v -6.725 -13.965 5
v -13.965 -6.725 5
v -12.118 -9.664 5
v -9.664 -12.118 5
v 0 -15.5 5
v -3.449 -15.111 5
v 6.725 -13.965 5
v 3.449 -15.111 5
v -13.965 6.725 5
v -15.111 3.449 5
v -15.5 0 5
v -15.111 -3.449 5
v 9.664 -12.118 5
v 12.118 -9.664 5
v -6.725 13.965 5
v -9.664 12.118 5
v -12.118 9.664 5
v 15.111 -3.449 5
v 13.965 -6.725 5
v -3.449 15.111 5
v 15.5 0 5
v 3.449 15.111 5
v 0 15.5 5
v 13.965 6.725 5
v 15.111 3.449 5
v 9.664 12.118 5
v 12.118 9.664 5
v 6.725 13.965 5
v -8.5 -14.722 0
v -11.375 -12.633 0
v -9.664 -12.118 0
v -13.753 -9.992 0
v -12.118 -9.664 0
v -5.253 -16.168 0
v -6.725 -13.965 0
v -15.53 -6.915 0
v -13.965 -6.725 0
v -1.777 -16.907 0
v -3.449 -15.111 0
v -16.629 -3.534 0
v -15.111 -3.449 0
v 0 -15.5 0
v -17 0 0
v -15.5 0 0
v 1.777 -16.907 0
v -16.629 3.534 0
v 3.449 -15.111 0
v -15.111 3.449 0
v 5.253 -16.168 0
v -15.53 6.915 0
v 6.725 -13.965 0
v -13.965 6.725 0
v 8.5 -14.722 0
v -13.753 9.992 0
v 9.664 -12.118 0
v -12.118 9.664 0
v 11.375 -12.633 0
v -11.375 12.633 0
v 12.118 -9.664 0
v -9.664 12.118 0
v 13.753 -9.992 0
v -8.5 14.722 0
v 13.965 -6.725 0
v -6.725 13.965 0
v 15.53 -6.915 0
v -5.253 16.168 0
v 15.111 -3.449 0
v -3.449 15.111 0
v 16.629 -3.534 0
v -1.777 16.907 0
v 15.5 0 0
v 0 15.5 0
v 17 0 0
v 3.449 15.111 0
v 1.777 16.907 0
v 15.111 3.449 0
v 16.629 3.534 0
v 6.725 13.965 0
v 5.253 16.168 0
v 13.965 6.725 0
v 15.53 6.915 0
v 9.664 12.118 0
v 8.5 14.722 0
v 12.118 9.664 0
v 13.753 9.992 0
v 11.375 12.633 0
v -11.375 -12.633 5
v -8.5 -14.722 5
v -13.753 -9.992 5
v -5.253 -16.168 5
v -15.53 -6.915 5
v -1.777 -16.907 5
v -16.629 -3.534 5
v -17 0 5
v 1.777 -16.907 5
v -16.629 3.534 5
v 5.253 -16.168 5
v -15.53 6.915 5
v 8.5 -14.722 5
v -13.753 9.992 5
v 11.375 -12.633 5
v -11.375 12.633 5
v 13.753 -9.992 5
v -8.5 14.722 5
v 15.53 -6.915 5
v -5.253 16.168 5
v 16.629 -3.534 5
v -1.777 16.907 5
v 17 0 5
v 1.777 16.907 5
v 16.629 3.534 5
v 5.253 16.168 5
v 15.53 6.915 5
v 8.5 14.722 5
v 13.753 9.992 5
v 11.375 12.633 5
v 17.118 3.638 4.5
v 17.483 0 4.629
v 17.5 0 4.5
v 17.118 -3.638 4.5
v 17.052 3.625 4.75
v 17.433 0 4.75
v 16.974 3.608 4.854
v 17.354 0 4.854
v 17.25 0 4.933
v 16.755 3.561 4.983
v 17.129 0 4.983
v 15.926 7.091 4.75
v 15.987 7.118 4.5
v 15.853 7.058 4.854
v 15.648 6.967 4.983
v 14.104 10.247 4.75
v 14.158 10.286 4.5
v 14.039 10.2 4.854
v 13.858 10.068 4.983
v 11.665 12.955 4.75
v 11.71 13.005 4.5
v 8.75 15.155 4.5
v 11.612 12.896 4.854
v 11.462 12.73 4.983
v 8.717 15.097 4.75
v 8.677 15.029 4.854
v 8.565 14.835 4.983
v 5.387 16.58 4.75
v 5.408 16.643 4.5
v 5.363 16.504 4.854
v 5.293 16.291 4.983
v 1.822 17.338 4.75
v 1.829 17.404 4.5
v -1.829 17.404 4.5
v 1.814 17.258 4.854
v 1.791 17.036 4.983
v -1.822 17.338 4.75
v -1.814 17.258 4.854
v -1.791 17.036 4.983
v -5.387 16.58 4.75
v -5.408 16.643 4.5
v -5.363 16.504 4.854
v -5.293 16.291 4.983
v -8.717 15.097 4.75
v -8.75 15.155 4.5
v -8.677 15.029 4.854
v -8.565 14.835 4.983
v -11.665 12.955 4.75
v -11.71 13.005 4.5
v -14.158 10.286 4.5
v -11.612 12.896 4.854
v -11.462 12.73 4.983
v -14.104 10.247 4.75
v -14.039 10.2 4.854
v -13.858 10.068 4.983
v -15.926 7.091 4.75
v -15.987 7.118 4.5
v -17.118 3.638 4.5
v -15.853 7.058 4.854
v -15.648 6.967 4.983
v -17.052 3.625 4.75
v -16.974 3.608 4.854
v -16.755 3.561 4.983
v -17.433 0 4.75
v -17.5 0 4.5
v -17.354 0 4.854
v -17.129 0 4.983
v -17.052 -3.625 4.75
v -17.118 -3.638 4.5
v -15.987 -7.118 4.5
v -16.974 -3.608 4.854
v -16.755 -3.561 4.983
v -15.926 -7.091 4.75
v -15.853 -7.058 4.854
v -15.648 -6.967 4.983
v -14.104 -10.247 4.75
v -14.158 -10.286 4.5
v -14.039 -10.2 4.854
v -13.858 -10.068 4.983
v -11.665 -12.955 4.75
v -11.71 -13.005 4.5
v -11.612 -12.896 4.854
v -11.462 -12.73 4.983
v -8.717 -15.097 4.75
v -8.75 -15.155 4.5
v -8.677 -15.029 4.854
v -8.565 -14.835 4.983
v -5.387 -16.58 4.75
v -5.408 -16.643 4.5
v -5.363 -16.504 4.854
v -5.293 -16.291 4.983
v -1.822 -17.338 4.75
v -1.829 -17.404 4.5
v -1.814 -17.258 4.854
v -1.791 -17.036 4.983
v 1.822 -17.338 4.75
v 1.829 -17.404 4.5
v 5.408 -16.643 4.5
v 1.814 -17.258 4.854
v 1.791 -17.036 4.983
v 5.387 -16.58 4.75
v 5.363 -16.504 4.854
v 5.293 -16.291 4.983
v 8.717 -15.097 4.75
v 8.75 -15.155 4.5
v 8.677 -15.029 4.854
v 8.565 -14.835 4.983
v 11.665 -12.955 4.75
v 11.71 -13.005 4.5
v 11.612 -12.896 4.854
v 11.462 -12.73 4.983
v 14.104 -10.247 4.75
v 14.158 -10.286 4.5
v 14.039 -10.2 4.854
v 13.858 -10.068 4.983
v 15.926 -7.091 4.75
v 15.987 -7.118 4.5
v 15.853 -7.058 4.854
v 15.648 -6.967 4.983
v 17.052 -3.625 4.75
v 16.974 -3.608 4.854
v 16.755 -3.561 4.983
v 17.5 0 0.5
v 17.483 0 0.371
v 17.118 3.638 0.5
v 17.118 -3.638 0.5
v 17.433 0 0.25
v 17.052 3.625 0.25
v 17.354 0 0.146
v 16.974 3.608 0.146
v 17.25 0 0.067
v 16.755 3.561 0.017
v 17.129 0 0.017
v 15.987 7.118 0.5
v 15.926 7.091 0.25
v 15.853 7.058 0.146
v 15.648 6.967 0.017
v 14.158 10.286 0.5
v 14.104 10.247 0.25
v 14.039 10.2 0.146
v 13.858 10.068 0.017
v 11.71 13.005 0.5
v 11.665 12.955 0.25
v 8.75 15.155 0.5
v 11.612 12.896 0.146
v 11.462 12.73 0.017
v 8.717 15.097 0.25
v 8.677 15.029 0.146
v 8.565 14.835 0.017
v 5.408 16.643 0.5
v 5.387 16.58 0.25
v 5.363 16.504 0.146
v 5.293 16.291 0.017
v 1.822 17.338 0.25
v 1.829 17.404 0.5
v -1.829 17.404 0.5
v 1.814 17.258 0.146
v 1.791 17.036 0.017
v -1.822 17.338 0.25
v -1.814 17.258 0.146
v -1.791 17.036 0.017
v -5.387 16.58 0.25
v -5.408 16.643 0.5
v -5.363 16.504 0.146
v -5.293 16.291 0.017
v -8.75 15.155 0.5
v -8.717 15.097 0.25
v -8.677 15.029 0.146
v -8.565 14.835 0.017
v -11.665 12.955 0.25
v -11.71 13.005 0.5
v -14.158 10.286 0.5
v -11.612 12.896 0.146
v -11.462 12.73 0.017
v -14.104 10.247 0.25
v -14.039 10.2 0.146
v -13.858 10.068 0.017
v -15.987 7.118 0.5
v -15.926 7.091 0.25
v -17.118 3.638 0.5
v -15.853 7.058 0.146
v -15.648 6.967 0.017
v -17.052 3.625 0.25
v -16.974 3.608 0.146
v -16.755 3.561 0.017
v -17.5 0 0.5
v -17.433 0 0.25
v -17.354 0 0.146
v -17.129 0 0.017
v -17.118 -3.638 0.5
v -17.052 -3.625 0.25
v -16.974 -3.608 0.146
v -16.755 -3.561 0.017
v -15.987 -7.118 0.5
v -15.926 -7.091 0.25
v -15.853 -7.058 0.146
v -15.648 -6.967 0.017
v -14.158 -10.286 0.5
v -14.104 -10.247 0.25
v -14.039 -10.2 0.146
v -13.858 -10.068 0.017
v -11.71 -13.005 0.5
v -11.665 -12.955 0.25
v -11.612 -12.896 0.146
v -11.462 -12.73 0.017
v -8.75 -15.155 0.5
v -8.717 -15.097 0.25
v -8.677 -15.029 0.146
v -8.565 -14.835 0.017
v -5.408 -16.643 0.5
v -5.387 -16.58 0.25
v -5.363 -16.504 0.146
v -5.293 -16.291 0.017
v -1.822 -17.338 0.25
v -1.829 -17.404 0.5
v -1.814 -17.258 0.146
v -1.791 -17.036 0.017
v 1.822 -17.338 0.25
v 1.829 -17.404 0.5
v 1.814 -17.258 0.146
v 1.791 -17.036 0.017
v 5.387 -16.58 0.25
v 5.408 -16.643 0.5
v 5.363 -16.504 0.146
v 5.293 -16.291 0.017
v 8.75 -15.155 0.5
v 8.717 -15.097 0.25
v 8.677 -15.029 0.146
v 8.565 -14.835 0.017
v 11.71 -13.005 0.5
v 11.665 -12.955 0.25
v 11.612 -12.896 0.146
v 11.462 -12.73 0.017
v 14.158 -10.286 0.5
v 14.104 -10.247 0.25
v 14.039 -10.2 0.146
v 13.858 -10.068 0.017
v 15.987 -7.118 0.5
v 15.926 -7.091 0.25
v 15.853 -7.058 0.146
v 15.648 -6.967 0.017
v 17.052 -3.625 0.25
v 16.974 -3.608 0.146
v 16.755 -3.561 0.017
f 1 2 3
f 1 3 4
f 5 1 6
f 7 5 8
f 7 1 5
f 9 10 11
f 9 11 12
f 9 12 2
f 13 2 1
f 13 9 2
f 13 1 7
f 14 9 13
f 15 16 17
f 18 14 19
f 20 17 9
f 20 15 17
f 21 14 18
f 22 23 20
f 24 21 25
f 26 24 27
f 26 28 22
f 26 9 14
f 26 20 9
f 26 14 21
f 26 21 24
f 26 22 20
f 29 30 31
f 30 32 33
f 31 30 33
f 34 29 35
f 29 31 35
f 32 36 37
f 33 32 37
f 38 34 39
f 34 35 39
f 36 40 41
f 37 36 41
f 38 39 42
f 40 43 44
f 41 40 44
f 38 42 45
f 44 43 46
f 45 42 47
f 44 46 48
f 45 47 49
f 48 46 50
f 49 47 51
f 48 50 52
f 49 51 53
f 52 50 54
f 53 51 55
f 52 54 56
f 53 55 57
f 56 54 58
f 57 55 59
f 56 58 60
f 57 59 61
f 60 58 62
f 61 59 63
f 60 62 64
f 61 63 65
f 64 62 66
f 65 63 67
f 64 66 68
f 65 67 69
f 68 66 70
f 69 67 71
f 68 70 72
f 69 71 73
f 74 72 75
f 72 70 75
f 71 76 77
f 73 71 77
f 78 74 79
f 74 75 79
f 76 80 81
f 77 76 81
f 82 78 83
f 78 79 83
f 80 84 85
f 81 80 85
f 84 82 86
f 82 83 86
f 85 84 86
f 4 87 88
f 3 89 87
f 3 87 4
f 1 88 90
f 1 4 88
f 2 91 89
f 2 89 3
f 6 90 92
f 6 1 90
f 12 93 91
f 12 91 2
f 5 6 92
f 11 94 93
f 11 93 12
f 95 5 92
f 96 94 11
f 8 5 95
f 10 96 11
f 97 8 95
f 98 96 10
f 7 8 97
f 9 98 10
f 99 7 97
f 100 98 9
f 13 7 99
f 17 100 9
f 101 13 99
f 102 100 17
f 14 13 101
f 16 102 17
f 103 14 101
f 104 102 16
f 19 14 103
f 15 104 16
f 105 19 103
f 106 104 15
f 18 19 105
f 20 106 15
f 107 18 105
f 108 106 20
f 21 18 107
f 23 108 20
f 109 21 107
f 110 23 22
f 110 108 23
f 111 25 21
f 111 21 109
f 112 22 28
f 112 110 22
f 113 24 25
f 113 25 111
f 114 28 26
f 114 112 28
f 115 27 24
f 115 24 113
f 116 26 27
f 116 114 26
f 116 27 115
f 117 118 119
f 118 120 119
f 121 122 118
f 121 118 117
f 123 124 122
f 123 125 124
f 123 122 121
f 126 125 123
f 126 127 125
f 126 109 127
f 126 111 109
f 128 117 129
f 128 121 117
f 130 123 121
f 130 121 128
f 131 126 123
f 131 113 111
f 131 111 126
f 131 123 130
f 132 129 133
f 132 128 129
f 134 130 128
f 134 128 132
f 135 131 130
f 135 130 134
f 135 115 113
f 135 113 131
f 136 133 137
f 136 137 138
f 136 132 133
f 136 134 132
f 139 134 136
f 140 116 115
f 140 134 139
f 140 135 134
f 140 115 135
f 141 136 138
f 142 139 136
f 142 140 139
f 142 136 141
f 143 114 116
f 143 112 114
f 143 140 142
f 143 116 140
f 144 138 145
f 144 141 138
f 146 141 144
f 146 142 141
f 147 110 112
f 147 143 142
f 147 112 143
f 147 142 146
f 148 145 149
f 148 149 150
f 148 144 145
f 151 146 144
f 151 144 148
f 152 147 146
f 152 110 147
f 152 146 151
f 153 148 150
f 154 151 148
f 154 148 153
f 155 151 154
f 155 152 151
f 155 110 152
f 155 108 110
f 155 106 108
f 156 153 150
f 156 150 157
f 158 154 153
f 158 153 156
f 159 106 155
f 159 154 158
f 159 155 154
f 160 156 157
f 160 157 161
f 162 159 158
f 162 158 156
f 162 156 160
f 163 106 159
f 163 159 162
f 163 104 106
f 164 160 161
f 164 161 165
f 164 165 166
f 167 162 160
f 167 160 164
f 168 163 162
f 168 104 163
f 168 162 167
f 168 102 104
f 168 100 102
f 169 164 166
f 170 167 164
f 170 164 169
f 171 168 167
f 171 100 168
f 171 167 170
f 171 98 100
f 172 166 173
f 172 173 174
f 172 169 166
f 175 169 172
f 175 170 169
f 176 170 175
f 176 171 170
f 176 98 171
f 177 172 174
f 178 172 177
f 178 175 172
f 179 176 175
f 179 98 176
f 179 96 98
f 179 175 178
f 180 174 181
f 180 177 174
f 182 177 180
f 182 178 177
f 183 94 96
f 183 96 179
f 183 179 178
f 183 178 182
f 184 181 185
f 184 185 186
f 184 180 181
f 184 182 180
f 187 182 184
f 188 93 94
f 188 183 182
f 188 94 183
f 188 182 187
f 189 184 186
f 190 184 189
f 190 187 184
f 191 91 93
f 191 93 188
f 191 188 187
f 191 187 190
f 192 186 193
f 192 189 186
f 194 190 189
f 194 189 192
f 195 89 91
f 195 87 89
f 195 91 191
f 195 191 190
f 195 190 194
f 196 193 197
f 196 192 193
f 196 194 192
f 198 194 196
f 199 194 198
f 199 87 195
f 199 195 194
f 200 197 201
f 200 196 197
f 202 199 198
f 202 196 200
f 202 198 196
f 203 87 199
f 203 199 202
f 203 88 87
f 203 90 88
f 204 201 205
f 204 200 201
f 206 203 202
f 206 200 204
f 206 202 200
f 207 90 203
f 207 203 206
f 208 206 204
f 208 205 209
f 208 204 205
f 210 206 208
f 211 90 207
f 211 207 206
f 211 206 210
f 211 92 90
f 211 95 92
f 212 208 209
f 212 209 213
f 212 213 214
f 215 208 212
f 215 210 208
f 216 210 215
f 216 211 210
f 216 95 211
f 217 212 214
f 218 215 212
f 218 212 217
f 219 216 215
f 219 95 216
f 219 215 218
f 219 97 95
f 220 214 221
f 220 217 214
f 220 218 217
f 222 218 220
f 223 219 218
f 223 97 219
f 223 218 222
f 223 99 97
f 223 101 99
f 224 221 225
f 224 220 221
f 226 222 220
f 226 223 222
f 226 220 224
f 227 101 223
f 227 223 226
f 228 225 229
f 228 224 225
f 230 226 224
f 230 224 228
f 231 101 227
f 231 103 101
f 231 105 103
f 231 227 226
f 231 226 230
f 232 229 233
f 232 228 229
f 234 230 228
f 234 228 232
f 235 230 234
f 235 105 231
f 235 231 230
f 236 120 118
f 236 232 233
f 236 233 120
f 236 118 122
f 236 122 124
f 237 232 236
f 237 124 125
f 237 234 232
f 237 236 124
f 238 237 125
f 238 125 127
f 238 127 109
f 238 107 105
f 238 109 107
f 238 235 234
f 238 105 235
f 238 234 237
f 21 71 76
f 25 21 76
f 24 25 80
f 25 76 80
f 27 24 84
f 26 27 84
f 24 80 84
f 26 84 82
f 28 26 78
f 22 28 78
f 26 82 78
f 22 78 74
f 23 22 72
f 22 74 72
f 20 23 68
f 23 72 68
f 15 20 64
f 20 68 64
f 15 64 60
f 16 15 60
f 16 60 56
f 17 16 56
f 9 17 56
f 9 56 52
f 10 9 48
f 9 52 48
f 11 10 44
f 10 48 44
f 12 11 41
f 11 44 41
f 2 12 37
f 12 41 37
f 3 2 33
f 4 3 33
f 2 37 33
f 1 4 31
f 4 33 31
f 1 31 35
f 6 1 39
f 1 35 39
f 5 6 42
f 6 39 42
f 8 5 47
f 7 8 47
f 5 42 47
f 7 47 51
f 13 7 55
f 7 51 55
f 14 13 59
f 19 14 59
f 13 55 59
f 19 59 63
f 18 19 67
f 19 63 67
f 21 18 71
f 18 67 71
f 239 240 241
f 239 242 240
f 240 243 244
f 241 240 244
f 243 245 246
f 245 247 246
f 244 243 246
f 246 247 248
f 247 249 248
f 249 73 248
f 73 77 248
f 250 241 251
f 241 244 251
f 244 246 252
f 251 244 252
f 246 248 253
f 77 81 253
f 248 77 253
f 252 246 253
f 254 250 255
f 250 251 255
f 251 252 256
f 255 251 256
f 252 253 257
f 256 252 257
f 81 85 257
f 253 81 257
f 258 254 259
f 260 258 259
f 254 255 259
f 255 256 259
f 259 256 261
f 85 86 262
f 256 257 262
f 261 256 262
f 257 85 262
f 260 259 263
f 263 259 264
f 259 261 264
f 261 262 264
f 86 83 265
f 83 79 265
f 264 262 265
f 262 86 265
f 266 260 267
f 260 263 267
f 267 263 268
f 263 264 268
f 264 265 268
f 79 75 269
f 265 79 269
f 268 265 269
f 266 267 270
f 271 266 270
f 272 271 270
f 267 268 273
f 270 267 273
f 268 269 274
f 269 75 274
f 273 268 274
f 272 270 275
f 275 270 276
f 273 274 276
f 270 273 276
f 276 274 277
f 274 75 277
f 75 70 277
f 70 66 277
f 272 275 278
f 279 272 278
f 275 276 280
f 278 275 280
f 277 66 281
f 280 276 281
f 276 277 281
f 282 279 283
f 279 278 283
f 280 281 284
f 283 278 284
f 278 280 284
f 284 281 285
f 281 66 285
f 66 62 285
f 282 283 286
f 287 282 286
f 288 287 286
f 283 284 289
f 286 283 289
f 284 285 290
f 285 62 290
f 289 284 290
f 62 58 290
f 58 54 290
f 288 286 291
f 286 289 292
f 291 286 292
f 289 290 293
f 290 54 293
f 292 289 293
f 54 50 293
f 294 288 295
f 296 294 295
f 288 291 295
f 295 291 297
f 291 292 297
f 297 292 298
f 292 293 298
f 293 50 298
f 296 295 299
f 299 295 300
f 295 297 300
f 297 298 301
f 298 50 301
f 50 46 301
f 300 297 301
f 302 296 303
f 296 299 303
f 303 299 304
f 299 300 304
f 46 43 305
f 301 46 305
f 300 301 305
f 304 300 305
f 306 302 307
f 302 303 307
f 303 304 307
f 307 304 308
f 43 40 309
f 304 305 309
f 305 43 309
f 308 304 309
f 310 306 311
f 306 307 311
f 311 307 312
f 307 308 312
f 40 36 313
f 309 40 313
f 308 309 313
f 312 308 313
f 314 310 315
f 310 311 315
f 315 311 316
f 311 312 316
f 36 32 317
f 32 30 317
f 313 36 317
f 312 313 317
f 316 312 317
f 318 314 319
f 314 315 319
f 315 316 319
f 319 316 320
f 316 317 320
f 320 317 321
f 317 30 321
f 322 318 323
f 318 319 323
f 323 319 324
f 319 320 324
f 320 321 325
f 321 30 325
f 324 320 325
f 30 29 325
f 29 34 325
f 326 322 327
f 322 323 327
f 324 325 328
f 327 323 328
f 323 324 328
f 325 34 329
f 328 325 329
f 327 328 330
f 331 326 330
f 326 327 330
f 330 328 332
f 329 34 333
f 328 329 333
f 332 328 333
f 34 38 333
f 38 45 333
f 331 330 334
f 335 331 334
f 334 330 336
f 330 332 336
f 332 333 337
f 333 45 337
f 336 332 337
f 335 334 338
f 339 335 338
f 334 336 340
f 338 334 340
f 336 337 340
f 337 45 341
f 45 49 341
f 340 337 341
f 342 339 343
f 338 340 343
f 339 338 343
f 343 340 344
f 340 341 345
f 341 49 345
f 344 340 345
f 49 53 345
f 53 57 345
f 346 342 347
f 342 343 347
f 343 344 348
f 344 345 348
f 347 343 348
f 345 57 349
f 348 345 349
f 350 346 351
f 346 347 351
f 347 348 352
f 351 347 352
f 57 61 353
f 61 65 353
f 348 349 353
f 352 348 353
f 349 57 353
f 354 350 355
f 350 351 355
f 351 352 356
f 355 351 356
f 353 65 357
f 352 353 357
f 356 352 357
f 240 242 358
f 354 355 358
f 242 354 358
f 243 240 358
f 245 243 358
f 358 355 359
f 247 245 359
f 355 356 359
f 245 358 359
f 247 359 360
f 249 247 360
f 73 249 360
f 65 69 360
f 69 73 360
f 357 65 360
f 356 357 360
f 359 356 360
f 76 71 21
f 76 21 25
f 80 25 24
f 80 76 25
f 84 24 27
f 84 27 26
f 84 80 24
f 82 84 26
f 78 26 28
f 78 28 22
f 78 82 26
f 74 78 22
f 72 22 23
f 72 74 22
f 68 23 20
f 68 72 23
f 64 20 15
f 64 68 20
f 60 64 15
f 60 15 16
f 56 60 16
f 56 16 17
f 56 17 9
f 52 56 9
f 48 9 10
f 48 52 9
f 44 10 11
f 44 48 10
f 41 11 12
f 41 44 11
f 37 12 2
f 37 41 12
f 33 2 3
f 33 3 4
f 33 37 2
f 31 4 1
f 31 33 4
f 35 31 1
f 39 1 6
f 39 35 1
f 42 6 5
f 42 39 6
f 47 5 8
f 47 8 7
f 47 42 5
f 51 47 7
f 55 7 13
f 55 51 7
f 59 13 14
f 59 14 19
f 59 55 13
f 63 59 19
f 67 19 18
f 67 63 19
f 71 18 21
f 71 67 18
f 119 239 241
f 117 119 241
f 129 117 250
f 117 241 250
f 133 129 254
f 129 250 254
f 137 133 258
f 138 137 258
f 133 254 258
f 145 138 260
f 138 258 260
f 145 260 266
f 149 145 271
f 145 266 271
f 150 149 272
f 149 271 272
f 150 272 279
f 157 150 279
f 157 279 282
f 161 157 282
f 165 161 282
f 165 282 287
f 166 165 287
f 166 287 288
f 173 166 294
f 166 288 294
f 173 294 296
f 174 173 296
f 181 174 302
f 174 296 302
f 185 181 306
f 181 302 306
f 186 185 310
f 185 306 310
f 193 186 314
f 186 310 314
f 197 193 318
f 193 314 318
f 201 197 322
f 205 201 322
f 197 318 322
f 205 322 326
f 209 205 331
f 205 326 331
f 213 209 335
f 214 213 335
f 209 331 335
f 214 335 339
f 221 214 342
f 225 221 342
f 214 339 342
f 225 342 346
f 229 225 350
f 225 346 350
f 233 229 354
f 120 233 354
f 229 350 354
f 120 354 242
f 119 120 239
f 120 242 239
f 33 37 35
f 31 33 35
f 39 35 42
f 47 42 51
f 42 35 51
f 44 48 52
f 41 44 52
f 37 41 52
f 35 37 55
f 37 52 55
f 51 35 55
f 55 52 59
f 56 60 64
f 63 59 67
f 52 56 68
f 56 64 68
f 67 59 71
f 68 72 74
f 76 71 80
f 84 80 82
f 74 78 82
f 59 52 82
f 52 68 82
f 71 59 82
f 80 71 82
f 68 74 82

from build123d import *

# Parameters (mm, degrees)
F0_R     = 17.5
F0_R_2   = 15.5
F1_DEPTH = 5
F2_DEPTH = 5
F3_R     = 0.5


with BuildPart() as f1:
    # F0 (on Top) → F1 (new body)
    with BuildSketch(Plane.XY):
        Circle(F0_R)
        Circle(F0_R_2, mode=Mode.SUBTRACT)
    extrude(amount=F1_DEPTH)

    # F3
    f3_edges = [f1.edges().sort_by_distance(p)[0] for p in [
        (-17.5, 0, 5),
        (-17.5, 0, 0),
    ]]
    fillet(f3_edges, radius=F3_R)


with BuildPart() as f2:
    # F0 (on Top) → F2 (new body)
    with BuildSketch(Plane.XY):
        Circle(F0_R_2)
    extrude(amount=F2_DEPTH)


solid = Compound([f1.part, f2.part])
